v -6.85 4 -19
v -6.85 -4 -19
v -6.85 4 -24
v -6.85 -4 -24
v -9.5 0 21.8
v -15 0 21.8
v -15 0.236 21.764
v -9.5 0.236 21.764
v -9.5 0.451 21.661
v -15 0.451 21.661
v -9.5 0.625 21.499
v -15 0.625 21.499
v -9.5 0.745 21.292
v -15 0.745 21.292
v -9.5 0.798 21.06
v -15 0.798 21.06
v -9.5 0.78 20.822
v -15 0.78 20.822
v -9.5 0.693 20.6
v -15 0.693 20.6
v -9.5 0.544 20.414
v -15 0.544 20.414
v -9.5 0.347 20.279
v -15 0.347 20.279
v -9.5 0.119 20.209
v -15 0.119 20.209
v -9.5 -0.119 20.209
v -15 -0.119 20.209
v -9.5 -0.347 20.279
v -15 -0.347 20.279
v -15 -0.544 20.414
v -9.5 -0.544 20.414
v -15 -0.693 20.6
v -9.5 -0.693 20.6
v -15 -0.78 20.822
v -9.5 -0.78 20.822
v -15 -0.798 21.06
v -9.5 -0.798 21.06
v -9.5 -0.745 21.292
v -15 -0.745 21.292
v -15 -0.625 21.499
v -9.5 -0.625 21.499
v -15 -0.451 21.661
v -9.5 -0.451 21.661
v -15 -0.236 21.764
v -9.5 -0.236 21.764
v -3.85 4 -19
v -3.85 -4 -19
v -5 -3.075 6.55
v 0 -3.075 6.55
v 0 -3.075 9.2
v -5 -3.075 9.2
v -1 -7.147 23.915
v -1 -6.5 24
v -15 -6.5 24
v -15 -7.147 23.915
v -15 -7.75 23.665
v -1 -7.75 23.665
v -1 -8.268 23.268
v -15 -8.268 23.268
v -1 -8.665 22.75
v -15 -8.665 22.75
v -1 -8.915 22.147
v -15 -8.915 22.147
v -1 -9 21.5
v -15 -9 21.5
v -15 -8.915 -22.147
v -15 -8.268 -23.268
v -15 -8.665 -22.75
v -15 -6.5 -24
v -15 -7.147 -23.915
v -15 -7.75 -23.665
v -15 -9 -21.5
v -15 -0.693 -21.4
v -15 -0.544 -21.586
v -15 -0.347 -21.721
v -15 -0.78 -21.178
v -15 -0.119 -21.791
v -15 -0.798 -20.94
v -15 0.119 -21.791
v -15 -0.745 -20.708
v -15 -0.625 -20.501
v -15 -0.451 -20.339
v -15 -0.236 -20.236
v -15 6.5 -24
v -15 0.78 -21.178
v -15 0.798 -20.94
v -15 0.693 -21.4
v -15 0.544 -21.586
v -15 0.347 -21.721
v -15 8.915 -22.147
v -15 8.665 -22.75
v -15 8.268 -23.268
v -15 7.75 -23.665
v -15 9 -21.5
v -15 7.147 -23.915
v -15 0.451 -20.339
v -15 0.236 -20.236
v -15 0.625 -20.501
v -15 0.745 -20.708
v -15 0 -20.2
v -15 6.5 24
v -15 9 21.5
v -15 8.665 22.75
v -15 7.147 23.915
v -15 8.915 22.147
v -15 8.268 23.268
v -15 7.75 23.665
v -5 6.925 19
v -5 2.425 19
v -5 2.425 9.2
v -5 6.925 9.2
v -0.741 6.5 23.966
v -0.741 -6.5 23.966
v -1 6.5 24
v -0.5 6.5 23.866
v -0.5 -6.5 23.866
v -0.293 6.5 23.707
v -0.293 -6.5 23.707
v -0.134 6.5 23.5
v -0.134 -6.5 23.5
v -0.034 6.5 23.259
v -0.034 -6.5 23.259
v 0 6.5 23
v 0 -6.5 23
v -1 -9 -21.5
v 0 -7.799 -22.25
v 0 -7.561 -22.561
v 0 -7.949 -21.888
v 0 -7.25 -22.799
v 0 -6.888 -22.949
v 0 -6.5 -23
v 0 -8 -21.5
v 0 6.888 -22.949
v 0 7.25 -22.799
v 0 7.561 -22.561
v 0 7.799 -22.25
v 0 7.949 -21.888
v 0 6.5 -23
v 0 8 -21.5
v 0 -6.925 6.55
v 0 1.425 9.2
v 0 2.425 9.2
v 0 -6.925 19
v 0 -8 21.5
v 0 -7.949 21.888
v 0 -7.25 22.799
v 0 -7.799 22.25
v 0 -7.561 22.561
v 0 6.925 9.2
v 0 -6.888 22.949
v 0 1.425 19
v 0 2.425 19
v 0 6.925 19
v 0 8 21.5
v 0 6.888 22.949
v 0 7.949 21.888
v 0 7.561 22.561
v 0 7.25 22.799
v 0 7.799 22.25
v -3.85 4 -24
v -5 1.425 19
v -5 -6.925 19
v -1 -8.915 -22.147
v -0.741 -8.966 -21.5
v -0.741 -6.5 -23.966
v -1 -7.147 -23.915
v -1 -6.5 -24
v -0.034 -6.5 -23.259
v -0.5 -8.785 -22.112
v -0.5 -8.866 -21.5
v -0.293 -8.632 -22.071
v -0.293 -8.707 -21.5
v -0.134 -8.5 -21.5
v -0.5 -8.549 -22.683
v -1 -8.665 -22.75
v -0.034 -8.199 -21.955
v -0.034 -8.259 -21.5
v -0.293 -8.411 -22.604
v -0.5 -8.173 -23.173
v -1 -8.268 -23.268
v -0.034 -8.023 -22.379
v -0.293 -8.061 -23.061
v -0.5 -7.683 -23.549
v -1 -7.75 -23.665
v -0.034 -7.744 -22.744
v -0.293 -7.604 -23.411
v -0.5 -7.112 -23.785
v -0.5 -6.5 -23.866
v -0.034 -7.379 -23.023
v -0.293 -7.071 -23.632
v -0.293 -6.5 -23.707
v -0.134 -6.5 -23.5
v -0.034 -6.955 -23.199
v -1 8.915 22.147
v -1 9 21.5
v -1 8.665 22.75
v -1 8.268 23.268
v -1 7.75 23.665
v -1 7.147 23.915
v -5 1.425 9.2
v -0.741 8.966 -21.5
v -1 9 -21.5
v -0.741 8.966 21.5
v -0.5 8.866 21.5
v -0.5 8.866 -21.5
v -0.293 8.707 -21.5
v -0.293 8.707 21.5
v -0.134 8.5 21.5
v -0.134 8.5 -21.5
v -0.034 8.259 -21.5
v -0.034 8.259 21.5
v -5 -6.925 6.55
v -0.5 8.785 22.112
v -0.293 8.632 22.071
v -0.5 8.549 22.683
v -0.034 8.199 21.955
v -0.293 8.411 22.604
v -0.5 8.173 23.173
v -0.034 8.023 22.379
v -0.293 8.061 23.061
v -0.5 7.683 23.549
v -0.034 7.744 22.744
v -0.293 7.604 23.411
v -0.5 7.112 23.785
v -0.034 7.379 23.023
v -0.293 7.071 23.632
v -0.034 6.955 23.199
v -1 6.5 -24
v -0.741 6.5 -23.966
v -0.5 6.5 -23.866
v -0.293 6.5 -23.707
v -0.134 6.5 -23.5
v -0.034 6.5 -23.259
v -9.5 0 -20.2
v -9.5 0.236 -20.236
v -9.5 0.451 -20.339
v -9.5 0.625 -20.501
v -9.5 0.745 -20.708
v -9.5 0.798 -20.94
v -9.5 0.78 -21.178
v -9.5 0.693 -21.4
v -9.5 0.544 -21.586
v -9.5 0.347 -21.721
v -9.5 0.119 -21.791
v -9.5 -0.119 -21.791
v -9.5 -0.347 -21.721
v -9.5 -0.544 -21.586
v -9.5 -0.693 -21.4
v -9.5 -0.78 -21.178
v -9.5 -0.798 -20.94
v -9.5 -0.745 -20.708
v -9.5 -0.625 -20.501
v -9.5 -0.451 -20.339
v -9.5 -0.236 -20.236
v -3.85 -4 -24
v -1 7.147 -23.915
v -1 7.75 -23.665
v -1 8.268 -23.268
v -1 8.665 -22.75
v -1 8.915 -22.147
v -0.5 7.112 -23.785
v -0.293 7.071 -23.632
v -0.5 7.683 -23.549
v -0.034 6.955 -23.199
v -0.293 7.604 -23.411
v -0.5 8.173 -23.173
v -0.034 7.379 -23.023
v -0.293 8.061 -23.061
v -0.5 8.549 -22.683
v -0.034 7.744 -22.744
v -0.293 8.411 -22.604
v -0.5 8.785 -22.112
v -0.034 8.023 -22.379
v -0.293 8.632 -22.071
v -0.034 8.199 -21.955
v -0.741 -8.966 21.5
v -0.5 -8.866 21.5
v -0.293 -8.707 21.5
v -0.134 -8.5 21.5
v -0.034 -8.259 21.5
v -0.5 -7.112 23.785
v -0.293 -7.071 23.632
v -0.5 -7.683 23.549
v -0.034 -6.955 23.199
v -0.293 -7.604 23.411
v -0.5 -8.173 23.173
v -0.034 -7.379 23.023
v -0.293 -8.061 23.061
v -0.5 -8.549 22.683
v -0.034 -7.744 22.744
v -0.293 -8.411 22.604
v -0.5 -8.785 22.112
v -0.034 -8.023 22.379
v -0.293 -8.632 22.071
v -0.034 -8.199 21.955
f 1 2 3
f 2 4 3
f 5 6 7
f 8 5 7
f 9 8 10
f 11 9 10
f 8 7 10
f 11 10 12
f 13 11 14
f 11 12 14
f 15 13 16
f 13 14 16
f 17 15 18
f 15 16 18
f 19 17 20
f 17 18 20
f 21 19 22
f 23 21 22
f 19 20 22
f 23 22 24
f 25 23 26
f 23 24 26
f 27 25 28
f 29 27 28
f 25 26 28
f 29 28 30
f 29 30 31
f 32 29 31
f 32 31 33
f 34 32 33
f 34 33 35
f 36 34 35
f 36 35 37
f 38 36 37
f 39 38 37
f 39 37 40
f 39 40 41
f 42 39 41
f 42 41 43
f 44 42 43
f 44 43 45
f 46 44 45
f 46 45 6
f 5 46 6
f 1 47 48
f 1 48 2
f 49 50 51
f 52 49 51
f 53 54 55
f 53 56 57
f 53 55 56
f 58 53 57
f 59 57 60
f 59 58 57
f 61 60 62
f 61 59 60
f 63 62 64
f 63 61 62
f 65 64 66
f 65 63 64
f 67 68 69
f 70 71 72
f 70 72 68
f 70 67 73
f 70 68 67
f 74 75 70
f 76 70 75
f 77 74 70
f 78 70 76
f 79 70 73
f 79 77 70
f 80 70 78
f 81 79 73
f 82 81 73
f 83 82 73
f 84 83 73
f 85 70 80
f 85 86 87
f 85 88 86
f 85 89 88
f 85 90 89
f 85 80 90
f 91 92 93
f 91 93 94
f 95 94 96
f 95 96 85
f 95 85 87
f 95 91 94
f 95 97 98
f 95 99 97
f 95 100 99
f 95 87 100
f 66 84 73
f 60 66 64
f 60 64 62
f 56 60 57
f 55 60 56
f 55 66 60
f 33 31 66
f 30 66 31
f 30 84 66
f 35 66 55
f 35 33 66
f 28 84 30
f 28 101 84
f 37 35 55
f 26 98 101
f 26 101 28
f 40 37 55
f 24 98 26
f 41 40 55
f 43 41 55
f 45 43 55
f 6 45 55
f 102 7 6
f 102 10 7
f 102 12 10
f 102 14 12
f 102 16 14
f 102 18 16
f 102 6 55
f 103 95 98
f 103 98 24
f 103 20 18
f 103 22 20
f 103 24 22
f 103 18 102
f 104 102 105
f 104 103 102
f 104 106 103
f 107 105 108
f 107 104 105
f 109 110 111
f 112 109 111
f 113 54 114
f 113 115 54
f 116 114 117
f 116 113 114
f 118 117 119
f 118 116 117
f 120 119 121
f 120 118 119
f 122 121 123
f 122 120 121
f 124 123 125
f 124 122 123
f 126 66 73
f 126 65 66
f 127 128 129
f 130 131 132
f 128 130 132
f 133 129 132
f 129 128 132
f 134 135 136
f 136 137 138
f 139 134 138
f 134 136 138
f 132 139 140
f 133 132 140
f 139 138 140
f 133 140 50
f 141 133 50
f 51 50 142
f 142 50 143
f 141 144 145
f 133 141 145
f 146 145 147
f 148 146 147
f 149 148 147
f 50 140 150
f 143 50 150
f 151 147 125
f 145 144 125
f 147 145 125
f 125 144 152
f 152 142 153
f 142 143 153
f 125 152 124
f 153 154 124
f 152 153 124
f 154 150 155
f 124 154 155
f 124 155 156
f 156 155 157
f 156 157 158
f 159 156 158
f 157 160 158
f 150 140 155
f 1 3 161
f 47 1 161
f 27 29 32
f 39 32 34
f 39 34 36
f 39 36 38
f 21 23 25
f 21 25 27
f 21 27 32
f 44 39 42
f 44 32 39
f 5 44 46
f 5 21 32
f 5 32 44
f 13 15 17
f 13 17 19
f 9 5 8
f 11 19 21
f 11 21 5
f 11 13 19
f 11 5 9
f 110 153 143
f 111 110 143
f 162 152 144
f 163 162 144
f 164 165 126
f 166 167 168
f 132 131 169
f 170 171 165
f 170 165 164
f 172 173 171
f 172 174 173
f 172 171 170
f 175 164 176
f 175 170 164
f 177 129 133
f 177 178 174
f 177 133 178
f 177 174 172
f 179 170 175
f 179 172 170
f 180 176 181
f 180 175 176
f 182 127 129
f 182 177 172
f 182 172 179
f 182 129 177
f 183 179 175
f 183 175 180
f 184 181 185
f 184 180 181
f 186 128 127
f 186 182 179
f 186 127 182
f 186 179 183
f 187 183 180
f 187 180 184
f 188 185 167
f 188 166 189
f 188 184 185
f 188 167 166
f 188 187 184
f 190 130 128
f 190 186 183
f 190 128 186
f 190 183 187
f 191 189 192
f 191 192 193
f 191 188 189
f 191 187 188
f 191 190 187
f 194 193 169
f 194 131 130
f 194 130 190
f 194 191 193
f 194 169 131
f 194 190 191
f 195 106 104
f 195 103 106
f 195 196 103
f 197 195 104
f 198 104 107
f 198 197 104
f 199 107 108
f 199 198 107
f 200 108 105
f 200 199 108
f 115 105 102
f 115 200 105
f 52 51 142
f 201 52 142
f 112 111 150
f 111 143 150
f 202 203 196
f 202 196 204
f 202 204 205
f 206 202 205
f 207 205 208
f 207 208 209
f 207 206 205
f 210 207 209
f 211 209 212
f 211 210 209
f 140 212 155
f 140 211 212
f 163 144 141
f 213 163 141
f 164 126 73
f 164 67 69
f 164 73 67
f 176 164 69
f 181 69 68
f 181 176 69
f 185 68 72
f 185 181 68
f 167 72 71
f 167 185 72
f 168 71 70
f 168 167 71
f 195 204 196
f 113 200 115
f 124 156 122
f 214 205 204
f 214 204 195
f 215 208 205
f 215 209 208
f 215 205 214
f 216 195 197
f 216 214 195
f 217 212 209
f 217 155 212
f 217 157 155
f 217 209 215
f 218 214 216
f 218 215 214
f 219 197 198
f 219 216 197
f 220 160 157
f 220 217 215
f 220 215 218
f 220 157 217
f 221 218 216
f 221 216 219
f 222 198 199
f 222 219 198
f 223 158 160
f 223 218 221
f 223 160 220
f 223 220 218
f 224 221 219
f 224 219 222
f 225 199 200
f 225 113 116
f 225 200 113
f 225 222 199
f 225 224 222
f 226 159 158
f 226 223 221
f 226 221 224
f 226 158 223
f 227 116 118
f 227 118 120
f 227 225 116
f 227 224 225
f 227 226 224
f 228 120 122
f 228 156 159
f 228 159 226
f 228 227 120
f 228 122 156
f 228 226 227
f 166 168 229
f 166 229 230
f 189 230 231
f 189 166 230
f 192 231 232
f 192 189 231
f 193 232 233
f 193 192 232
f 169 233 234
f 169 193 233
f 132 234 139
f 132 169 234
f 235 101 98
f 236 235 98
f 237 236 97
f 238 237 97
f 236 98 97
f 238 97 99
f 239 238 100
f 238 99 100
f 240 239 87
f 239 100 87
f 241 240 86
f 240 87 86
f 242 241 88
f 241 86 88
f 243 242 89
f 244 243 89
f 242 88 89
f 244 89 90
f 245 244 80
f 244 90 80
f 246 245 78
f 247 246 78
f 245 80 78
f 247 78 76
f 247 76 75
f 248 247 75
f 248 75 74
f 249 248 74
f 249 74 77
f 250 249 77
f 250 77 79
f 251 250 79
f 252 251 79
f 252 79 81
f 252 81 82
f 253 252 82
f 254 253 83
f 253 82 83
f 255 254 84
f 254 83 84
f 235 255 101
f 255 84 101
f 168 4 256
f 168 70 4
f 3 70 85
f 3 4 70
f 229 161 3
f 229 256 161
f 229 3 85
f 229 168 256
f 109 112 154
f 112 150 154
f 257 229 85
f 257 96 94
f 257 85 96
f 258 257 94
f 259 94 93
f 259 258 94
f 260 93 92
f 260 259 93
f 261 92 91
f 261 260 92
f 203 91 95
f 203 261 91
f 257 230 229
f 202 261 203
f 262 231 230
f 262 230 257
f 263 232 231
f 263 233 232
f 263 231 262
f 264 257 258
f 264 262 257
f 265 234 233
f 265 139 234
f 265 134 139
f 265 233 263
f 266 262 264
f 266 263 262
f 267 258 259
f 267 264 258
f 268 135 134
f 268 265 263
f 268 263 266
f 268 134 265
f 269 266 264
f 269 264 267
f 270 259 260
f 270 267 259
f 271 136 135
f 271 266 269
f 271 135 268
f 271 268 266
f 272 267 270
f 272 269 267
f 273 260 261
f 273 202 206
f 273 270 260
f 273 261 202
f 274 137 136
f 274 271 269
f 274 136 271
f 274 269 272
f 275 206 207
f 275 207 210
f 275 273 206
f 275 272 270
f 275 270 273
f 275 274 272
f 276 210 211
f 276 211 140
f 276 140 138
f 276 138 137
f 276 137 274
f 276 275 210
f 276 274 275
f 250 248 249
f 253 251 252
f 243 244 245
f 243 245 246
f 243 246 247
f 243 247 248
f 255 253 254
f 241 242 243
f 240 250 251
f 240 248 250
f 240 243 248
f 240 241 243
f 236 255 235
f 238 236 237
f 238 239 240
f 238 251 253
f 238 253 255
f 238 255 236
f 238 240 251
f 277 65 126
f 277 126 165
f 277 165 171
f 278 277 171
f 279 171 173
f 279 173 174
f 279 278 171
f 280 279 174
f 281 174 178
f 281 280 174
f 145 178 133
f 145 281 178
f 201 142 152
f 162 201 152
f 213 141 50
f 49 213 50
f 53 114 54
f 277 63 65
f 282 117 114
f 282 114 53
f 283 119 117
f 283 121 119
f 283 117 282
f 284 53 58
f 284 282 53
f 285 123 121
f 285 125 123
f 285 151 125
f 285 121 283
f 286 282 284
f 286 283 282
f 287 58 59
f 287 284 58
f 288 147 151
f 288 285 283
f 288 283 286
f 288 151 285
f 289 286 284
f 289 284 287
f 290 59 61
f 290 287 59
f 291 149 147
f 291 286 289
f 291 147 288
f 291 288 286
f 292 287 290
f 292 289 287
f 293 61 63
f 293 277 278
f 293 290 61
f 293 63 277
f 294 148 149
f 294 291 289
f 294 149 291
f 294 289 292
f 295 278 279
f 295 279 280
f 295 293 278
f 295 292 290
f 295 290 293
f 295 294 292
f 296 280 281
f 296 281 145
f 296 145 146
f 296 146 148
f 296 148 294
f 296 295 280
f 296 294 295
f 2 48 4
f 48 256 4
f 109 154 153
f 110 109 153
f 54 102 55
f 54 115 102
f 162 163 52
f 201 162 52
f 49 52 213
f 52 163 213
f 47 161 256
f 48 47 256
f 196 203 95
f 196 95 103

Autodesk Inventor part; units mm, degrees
ref_plane "YZ Plane" through (0, 0, 0) normal (1, 0, 0) x (0, 1, 0)
ref_plane "XZ Plane" through (0, 0, 0) normal (0, 1, 0) x (-1, 0, 0)
ref_plane "XY Plane" through (0, 0, 0) normal (0, 0, 1) x (1, 0, 0)
sketch "スケッチ2" plane through (0, -6.5, -24) normal (-1, 0, 0) x (0, 0, 1)
  arc A0 (2.5, 15.5) -> (0, 13) centre (2.5, 13) ccw projected
  line L0 (0, 0) -> (0, 13) projected
  arc A1 (0, 0) -> (2.5, -2.5) centre (2.5, 0) ccw projected
  line L1 (45.5, -2.5) -> (2.5, -2.5) projected
  arc A2 (45.5, -2.5) -> (48, 0) centre (45.5, 0) ccw projected
  line L2 (48, 13) -> (48, 0) projected
  arc A3 (48, 13) -> (45.5, 15.5) centre (45.5, 13) ccw projected
  line L3 (2.5, 15.5) -> (45.5, 15.5) projected
  point P0 (24, 6.5)
extrude "押し出し2" add sketch "スケッチ2" along normal blind 15
sketch "スケッチ1" plane through (-15, -6.5, -24) normal (-1, 0, 0) x (0, 0, 1)
  line L0 (24, 6.5) -> (24, -15.1868) construction
  circle A0 centre (45, 6.5) radius 0.8
  circle A1 centre (3, 6.5) radius 0.8
  line L1 (45, 6.5) -> (24, 6.5) construction
  dimension "d0" = 1.6
  dimension "d1" = 42
extrude "押し出し1" cut sketch "スケッチ1" against normal blind 5.5
sketch "スケッチ3" plane through (0, -6.5, -24) normal (-1, 0, 0) x (0, 0, -1)
  line L0 (-33.2, -7.925) -> (-43, -7.925)
  line L1 (-43, -7.925) -> (-43, 0.425)
  line L2 (-43, 0.425) -> (-30.55, 0.425)
  line L3 (-30.55, 0.425) -> (-30.55, -3.425)
  line L4 (-30.55, -3.425) -> (-33.2, -3.425)
  line L5 (-33.2, -3.425) -> (-33.2, -7.925)
  line L6 (-43, -13.425) -> (-43, -8.925)
  line L7 (-43, -8.925) -> (-33.2, -8.925)
  line L8 (-33.2, -8.925) -> (-33.2, -13.425)
  line L9 (-33.2, -13.425) -> (-43, -13.425)
  point P0 (-24, -6.5)
extrude "押し出し3" cut sketch "スケッチ3" along normal blind 5
fillet "フィレット1" radius 1 8 edges at (0, 8.2678, -23.2678) (0, 0, -24) (0, -8.2678, -23.2678) (0, -9, 0) (0, -8.2678, 23.2678) (0, 0, 24) (0, 8.2678, 23.2678) (0, 9, 0)
sketch "スケッチ4" plane through (-15, -6.5, -24) normal (0, 0, -1) x (-1, 0, 0)
  line L0 (-11.15, 2.5) -> (-8.15, 2.5)
  line L1 (-8.15, 2.5) -> (-8.15, 10.5)
  line L2 (-8.15, 10.5) -> (-11.15, 10.5)
  line L3 (-11.15, 10.5) -> (-11.15, 2.5)
  line L4 (-15, 6.5) -> (-11.15, 6.5) construction
  dimension "d9" = 8
  dimension "d10" = 3
  dimension "d11" = 3.85
extrude "押し出し4" cut sketch "スケッチ4" against normal blind 5
properties part number "U2D2" material "ABS プラスチック"
